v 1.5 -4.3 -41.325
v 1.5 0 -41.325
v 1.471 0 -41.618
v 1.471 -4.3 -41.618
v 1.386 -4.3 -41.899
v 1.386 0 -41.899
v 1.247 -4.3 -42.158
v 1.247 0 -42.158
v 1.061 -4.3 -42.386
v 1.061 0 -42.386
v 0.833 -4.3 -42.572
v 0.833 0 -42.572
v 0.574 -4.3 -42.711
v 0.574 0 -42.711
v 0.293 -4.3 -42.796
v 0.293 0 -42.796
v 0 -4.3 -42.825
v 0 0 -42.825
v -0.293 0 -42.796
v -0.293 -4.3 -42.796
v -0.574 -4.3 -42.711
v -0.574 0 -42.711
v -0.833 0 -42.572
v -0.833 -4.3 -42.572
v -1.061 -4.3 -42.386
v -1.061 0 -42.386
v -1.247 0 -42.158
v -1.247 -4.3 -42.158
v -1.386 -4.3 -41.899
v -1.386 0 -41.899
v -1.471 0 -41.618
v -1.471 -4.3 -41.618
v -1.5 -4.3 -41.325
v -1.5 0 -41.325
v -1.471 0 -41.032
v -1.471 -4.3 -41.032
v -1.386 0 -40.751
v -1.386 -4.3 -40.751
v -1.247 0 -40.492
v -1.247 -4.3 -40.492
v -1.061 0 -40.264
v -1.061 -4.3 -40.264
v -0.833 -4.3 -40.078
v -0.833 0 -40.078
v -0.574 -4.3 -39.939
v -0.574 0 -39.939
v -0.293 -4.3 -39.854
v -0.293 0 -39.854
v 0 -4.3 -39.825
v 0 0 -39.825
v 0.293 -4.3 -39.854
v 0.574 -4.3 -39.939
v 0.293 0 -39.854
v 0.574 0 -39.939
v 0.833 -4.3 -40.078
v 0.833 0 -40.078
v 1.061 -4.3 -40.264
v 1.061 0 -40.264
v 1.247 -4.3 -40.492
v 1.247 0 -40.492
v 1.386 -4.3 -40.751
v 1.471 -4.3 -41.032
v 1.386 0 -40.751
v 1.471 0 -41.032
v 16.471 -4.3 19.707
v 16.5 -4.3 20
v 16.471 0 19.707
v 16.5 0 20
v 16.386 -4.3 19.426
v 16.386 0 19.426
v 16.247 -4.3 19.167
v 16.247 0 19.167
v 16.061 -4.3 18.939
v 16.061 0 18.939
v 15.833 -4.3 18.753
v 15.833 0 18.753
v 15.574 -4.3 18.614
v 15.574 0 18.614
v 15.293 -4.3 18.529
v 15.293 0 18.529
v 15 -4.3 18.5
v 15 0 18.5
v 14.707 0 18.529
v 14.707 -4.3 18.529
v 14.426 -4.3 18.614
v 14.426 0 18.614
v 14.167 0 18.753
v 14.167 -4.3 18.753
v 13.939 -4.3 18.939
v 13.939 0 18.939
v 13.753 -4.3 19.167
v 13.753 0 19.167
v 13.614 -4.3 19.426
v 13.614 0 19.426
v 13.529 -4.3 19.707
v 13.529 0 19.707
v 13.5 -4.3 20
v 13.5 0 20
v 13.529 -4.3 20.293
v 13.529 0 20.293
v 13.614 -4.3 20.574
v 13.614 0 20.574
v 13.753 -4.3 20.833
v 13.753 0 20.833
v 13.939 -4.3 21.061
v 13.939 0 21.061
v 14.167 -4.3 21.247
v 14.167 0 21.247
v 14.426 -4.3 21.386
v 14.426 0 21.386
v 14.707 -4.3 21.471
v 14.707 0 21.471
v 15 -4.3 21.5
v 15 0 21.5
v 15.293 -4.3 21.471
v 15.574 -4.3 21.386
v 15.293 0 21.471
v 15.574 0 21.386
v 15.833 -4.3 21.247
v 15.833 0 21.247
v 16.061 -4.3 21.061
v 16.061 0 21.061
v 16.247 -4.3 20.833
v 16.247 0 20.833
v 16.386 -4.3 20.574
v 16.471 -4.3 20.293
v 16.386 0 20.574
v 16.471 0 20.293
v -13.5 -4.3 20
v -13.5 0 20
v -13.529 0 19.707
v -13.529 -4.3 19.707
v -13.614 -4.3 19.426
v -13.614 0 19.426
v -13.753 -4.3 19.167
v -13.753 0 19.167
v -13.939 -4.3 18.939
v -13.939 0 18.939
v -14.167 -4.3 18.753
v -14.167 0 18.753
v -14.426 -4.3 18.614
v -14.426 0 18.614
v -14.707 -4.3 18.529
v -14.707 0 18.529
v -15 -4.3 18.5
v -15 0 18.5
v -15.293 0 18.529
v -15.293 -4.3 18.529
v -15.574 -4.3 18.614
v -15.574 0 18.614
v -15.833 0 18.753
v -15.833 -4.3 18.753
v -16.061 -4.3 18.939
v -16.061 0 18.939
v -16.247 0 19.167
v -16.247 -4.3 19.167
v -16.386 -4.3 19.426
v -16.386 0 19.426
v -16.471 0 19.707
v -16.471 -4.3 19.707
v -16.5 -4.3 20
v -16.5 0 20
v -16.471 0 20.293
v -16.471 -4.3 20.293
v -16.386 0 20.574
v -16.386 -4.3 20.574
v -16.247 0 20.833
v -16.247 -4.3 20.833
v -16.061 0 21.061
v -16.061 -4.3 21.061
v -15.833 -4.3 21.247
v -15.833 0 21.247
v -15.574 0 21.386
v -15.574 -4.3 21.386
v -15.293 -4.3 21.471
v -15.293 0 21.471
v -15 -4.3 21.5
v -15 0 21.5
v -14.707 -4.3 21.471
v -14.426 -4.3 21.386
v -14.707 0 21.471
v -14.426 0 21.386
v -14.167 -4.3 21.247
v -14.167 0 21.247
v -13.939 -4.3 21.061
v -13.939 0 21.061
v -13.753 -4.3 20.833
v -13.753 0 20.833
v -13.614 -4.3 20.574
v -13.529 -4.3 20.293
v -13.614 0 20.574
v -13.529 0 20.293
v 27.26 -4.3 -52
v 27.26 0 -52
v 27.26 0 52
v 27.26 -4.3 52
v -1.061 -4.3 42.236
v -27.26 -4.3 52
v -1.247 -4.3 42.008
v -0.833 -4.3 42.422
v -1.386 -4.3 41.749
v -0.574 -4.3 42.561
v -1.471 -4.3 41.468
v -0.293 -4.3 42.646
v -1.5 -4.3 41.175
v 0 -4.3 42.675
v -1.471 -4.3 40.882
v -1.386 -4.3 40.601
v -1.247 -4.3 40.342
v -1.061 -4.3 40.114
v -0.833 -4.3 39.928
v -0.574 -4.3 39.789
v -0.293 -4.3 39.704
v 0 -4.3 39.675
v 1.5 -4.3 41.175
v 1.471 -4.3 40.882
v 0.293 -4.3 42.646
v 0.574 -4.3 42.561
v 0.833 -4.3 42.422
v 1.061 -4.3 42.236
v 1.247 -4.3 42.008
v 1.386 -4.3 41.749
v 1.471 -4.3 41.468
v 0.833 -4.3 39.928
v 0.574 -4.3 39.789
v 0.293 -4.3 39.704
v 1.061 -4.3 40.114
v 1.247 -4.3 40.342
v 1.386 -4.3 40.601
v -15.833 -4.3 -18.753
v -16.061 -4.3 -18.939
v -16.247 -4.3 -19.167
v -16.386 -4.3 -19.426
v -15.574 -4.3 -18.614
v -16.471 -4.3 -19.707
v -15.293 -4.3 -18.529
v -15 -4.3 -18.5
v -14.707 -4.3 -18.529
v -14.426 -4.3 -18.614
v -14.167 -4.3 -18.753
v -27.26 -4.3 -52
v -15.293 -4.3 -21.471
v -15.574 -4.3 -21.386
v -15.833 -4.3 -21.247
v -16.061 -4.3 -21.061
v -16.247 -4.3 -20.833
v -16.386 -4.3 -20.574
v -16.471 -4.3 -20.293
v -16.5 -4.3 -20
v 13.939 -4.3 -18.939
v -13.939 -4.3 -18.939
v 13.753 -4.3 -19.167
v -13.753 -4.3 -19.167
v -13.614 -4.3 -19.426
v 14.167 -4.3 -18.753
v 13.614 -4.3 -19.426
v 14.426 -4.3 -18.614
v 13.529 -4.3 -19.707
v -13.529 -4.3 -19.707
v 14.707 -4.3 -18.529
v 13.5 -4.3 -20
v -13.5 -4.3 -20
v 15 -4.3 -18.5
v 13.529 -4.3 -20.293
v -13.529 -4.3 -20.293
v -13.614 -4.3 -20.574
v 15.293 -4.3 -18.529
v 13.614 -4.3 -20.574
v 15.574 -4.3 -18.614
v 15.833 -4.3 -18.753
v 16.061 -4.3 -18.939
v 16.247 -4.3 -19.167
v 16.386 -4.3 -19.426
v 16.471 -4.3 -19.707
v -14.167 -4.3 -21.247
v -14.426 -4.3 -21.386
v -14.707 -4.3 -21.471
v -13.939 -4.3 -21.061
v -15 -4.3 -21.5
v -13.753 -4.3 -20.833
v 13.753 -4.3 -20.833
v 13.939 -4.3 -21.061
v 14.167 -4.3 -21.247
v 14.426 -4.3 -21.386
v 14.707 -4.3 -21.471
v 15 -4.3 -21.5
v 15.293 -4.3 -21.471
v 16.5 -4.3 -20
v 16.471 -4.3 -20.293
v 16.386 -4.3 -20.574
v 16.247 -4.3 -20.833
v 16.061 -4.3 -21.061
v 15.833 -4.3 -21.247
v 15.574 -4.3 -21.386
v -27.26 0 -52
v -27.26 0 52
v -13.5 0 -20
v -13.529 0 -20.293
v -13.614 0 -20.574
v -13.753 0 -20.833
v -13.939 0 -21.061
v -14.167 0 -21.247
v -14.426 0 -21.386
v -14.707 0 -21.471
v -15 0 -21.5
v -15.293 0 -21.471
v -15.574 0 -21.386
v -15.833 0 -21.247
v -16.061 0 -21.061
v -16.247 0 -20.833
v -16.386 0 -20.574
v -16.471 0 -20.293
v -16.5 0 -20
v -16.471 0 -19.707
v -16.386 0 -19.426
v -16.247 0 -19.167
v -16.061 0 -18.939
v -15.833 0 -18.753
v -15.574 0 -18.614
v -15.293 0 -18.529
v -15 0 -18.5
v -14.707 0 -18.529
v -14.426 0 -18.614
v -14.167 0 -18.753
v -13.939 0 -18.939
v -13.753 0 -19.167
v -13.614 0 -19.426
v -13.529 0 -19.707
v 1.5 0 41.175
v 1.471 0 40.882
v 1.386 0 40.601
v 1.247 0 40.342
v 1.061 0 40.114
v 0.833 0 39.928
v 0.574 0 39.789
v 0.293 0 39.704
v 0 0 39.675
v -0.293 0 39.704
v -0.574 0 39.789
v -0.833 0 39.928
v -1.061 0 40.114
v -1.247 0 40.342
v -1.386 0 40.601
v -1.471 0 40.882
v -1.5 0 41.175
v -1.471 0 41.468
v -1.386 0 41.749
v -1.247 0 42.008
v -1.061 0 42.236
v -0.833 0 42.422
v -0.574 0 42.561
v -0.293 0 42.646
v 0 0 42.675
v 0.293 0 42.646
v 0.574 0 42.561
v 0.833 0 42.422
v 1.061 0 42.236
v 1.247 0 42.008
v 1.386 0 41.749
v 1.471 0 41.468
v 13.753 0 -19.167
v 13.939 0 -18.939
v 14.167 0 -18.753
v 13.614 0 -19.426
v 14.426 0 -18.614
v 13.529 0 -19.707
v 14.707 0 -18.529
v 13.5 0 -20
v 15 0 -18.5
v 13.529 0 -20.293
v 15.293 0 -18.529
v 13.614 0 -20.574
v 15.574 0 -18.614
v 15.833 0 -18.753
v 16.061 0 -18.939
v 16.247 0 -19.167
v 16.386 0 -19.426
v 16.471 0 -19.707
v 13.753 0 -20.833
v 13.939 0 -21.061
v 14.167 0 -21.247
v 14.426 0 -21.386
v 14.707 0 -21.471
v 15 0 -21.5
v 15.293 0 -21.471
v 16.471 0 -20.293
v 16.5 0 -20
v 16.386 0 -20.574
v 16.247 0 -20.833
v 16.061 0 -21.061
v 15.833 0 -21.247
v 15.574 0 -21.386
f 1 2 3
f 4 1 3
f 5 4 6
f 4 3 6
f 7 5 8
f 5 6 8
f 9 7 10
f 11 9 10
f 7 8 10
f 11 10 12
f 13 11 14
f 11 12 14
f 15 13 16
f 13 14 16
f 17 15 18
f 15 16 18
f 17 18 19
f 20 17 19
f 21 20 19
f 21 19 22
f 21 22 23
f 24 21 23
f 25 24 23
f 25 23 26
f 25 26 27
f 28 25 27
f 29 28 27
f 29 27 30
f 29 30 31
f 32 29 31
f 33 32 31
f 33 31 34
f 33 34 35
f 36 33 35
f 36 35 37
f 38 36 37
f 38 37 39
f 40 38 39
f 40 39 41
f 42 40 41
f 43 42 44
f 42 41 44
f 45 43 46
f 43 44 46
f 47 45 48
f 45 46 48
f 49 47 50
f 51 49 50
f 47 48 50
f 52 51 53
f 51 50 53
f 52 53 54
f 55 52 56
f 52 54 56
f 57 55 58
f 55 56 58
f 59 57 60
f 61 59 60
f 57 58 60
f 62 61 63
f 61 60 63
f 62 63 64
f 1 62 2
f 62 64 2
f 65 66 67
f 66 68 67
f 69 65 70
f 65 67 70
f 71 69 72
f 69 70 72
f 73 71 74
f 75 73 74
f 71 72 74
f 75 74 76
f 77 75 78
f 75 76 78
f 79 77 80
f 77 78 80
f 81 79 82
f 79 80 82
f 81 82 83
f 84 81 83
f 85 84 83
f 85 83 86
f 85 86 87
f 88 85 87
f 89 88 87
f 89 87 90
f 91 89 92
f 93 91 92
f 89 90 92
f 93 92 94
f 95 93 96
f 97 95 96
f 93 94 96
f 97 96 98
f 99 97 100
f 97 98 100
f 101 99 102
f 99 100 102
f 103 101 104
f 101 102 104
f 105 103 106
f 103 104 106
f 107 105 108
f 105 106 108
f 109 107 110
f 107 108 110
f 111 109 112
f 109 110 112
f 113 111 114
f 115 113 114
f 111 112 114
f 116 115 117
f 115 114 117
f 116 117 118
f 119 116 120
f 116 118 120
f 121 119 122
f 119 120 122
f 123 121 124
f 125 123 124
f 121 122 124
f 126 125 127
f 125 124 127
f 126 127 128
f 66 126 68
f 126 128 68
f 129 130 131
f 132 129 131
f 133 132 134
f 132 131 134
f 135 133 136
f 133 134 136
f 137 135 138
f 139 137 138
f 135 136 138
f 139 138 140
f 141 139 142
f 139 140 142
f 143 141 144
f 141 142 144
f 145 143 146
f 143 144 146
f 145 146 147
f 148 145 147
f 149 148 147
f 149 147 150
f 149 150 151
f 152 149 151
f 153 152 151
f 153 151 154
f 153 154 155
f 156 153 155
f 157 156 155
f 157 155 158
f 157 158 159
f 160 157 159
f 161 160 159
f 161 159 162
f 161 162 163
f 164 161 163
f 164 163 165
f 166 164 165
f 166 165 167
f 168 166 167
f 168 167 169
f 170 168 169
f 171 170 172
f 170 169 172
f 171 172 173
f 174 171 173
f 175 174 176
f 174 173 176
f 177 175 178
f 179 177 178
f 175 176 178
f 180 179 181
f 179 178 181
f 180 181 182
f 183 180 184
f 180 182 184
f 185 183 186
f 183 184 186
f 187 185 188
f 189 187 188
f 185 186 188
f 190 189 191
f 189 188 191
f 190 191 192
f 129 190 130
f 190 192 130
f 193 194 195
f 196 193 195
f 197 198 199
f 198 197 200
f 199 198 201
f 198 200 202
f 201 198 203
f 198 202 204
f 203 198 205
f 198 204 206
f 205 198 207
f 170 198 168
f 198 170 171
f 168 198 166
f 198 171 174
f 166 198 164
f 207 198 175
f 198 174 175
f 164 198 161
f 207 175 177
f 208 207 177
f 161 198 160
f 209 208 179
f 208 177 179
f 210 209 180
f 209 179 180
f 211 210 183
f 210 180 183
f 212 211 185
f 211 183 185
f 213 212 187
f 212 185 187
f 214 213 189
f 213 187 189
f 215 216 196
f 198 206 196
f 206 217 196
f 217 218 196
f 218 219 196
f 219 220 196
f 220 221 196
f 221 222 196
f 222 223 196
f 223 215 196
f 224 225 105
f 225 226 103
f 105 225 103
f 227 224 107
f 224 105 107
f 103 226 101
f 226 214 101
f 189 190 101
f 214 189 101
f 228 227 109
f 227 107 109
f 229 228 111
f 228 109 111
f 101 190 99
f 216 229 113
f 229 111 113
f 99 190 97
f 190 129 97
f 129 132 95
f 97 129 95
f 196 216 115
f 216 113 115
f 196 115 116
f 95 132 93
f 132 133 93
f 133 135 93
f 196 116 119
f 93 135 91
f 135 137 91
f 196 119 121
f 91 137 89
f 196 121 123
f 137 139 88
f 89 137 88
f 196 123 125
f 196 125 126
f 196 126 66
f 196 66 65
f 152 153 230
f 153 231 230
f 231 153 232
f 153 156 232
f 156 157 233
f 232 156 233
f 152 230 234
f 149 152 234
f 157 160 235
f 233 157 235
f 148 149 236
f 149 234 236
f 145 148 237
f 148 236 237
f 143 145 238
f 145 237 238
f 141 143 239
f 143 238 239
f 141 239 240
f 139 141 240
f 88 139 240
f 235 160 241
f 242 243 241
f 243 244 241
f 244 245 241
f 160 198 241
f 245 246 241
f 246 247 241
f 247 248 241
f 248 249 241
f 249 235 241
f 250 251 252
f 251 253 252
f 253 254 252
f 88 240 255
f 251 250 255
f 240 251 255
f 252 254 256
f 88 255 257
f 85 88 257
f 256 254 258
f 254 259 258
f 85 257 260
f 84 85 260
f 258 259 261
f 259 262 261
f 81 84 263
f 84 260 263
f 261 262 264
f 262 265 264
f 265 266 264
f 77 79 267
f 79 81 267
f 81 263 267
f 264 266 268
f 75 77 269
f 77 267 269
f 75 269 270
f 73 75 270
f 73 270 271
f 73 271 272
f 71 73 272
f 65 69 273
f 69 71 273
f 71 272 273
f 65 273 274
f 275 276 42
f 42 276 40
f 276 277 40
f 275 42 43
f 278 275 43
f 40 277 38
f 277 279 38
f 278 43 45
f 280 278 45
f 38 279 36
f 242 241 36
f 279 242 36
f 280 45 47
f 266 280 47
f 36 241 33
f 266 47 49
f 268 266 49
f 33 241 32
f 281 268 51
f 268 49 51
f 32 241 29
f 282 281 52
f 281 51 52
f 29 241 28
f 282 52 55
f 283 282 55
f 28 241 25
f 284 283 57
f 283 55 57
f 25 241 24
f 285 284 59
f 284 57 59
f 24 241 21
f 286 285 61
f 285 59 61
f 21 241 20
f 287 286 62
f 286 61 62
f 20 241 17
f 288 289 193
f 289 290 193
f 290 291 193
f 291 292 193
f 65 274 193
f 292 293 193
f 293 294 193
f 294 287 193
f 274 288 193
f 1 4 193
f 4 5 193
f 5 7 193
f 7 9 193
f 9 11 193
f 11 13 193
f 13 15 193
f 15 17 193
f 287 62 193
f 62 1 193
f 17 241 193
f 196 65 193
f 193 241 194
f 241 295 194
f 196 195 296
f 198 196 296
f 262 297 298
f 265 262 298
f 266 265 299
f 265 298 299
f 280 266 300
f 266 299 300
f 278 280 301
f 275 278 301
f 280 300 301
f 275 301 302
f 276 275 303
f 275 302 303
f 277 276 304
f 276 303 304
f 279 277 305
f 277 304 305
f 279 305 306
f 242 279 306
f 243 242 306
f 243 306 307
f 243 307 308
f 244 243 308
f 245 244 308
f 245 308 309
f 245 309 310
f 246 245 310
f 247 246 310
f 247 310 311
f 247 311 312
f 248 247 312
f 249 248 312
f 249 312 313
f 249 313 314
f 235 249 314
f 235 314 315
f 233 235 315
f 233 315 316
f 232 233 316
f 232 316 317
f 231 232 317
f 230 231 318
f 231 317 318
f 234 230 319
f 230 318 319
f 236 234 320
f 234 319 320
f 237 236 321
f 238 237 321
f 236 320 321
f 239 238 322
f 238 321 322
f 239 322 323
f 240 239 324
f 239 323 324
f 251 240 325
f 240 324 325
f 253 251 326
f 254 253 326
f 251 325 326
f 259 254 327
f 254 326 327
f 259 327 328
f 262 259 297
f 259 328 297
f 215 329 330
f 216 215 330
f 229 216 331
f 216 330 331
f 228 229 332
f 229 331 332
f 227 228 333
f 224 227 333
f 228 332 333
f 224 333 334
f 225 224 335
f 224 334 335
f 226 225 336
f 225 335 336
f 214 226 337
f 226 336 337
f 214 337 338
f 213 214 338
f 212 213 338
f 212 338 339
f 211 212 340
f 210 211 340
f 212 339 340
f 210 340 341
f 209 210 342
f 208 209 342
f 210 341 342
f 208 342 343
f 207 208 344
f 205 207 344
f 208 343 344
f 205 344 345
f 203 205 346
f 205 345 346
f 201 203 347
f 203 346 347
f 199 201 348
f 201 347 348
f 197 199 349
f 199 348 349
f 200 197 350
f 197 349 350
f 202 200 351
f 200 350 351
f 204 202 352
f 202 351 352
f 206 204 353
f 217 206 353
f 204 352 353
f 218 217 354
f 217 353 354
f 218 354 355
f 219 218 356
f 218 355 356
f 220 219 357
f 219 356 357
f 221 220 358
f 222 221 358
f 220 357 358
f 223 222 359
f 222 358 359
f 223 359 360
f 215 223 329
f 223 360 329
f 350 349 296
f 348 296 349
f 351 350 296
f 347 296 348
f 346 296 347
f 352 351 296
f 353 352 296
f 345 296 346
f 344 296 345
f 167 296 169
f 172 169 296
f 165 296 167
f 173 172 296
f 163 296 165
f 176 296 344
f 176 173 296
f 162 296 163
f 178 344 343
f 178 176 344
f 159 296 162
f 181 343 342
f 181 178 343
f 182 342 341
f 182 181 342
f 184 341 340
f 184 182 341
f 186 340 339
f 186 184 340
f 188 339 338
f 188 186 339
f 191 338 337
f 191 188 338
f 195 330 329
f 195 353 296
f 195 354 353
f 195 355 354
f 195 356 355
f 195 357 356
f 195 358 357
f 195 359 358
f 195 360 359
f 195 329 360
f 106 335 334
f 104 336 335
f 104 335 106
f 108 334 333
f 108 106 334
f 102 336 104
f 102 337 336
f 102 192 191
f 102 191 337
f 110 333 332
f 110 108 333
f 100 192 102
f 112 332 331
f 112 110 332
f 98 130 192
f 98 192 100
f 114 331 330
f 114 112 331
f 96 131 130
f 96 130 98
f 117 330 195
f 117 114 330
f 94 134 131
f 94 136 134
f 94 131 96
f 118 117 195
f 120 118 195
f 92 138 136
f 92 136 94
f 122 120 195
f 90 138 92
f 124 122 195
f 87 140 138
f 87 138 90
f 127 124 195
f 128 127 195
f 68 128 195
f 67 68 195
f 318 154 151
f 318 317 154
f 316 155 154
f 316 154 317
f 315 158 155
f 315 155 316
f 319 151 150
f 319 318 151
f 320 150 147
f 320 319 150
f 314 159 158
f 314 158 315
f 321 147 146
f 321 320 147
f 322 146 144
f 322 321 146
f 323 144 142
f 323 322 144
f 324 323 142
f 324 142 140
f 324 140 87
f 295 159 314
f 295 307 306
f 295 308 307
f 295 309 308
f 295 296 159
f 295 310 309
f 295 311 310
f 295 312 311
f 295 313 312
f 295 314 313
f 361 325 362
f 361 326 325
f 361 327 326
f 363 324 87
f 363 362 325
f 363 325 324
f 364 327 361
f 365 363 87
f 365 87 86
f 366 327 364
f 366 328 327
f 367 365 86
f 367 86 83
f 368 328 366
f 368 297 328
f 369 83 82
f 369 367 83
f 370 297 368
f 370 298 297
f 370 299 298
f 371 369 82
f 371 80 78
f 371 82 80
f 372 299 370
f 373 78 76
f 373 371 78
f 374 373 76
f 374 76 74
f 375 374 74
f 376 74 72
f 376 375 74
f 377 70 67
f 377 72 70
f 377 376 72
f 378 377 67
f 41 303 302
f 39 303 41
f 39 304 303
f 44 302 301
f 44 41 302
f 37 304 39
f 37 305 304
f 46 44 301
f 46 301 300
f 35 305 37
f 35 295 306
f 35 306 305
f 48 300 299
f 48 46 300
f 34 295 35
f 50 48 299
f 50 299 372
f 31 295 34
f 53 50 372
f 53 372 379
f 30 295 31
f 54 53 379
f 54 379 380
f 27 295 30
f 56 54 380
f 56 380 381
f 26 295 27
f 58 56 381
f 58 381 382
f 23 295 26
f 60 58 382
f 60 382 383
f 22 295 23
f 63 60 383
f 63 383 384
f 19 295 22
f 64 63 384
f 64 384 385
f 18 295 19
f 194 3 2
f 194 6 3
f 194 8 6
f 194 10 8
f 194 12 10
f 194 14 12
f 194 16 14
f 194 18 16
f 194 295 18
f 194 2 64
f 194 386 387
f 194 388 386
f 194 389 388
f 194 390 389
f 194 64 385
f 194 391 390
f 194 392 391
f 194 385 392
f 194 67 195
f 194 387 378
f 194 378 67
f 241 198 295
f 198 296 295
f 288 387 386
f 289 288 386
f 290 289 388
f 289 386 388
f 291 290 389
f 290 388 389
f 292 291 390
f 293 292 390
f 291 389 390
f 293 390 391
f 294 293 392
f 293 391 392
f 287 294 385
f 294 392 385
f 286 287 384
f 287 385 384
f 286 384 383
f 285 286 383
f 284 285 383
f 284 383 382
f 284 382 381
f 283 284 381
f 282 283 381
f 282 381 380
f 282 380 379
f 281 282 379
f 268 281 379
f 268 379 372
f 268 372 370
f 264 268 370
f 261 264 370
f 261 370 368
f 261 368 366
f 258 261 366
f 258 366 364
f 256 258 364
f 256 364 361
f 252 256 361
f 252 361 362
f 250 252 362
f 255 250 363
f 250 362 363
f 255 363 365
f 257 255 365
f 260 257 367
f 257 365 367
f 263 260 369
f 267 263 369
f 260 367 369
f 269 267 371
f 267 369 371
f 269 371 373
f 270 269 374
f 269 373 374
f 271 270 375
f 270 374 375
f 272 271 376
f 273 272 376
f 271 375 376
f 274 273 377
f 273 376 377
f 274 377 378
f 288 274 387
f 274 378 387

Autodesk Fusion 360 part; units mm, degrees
sketch "Sketch1" plane through (0, 0, 0) normal (0, 1, 0) x (1, 0, 0)
  line L0 (-27.26, -52) -> (-27.26, 52)
  line L1 (-27.26, 52) -> (27.26, 52)
  line L2 (27.26, 52) -> (27.26, -52)
  line L3 (0, 80) -> (0, -60) construction
  line L4 (-60, 0) -> (45.848, 0) construction
  line L5 (-15, 52) -> (-15, 35.15) construction
  line L6 (-15, 35.15) -> (15, 35.15) construction
  line L7 (15, 35.15) -> (15, 52) construction
  circle A0 centre (0, 41.325) radius 6.175
  line L8 (-15, 52) -> (-15, 20) construction
  line L9 (-15, 20) -> (15, 20) construction
  line L10 (15, 20) -> (15, 52) construction
  line L11 (-15, 20) -> (-15, -20) construction
  line L12 (-15, -20) -> (15, -20) construction
  line L13 (15, -20) -> (15, 20) construction
  line L14 (27.26, -52) -> (-27.26, -52)
  line L15 (15, -52) -> (15, -35) construction
  line L16 (15, -35) -> (-15, -35) construction
  line L17 (-15, -35) -> (-15, -52) construction
  line L18 (-15, -20) -> (-15, -35) construction
  line L19 (15, -20) -> (15, -35) construction
  circle A1 centre (0, -41.175) radius 6.175
  dimension "d2" = 54.52
  dimension "d6" = 16.85
  dimension "d7" = 12.35
  dimension "d9" = 32
  dimension "d10" = 40
  dimension "d12" = 104
  dimension "d16" = 17
  dimension "d17" = 12.35
extrude "Extrude1" add sketch "Sketch1" against normal blind 4.3 contours L0 L1 L2 L14 | A0 | A1
sketch "Sketch2" plane through (0, 0, 0) normal (0, 1, 0) x (1, 0, 0)
  circle A0 centre (-15, -20) radius 1.5
  circle A1 centre (15, -20) radius 1.5
  circle A2 centre (-15, 20) radius 1.5
  circle A3 centre (15, 20) radius 1.5
  circle A4 centre (0, 41.325) radius 1.5
  circle A5 centre (0, -41.175) radius 1.5
  dimension "d20" = 3
  dimension "d21" = 3
  dimension "d22" = 3
  dimension "d23" = 3
  dimension "d24" = 3
  dimension "d25" = 3
extrude "Extrude2" cut sketch "Sketch2" against normal up to surface (4.3 mm away)
